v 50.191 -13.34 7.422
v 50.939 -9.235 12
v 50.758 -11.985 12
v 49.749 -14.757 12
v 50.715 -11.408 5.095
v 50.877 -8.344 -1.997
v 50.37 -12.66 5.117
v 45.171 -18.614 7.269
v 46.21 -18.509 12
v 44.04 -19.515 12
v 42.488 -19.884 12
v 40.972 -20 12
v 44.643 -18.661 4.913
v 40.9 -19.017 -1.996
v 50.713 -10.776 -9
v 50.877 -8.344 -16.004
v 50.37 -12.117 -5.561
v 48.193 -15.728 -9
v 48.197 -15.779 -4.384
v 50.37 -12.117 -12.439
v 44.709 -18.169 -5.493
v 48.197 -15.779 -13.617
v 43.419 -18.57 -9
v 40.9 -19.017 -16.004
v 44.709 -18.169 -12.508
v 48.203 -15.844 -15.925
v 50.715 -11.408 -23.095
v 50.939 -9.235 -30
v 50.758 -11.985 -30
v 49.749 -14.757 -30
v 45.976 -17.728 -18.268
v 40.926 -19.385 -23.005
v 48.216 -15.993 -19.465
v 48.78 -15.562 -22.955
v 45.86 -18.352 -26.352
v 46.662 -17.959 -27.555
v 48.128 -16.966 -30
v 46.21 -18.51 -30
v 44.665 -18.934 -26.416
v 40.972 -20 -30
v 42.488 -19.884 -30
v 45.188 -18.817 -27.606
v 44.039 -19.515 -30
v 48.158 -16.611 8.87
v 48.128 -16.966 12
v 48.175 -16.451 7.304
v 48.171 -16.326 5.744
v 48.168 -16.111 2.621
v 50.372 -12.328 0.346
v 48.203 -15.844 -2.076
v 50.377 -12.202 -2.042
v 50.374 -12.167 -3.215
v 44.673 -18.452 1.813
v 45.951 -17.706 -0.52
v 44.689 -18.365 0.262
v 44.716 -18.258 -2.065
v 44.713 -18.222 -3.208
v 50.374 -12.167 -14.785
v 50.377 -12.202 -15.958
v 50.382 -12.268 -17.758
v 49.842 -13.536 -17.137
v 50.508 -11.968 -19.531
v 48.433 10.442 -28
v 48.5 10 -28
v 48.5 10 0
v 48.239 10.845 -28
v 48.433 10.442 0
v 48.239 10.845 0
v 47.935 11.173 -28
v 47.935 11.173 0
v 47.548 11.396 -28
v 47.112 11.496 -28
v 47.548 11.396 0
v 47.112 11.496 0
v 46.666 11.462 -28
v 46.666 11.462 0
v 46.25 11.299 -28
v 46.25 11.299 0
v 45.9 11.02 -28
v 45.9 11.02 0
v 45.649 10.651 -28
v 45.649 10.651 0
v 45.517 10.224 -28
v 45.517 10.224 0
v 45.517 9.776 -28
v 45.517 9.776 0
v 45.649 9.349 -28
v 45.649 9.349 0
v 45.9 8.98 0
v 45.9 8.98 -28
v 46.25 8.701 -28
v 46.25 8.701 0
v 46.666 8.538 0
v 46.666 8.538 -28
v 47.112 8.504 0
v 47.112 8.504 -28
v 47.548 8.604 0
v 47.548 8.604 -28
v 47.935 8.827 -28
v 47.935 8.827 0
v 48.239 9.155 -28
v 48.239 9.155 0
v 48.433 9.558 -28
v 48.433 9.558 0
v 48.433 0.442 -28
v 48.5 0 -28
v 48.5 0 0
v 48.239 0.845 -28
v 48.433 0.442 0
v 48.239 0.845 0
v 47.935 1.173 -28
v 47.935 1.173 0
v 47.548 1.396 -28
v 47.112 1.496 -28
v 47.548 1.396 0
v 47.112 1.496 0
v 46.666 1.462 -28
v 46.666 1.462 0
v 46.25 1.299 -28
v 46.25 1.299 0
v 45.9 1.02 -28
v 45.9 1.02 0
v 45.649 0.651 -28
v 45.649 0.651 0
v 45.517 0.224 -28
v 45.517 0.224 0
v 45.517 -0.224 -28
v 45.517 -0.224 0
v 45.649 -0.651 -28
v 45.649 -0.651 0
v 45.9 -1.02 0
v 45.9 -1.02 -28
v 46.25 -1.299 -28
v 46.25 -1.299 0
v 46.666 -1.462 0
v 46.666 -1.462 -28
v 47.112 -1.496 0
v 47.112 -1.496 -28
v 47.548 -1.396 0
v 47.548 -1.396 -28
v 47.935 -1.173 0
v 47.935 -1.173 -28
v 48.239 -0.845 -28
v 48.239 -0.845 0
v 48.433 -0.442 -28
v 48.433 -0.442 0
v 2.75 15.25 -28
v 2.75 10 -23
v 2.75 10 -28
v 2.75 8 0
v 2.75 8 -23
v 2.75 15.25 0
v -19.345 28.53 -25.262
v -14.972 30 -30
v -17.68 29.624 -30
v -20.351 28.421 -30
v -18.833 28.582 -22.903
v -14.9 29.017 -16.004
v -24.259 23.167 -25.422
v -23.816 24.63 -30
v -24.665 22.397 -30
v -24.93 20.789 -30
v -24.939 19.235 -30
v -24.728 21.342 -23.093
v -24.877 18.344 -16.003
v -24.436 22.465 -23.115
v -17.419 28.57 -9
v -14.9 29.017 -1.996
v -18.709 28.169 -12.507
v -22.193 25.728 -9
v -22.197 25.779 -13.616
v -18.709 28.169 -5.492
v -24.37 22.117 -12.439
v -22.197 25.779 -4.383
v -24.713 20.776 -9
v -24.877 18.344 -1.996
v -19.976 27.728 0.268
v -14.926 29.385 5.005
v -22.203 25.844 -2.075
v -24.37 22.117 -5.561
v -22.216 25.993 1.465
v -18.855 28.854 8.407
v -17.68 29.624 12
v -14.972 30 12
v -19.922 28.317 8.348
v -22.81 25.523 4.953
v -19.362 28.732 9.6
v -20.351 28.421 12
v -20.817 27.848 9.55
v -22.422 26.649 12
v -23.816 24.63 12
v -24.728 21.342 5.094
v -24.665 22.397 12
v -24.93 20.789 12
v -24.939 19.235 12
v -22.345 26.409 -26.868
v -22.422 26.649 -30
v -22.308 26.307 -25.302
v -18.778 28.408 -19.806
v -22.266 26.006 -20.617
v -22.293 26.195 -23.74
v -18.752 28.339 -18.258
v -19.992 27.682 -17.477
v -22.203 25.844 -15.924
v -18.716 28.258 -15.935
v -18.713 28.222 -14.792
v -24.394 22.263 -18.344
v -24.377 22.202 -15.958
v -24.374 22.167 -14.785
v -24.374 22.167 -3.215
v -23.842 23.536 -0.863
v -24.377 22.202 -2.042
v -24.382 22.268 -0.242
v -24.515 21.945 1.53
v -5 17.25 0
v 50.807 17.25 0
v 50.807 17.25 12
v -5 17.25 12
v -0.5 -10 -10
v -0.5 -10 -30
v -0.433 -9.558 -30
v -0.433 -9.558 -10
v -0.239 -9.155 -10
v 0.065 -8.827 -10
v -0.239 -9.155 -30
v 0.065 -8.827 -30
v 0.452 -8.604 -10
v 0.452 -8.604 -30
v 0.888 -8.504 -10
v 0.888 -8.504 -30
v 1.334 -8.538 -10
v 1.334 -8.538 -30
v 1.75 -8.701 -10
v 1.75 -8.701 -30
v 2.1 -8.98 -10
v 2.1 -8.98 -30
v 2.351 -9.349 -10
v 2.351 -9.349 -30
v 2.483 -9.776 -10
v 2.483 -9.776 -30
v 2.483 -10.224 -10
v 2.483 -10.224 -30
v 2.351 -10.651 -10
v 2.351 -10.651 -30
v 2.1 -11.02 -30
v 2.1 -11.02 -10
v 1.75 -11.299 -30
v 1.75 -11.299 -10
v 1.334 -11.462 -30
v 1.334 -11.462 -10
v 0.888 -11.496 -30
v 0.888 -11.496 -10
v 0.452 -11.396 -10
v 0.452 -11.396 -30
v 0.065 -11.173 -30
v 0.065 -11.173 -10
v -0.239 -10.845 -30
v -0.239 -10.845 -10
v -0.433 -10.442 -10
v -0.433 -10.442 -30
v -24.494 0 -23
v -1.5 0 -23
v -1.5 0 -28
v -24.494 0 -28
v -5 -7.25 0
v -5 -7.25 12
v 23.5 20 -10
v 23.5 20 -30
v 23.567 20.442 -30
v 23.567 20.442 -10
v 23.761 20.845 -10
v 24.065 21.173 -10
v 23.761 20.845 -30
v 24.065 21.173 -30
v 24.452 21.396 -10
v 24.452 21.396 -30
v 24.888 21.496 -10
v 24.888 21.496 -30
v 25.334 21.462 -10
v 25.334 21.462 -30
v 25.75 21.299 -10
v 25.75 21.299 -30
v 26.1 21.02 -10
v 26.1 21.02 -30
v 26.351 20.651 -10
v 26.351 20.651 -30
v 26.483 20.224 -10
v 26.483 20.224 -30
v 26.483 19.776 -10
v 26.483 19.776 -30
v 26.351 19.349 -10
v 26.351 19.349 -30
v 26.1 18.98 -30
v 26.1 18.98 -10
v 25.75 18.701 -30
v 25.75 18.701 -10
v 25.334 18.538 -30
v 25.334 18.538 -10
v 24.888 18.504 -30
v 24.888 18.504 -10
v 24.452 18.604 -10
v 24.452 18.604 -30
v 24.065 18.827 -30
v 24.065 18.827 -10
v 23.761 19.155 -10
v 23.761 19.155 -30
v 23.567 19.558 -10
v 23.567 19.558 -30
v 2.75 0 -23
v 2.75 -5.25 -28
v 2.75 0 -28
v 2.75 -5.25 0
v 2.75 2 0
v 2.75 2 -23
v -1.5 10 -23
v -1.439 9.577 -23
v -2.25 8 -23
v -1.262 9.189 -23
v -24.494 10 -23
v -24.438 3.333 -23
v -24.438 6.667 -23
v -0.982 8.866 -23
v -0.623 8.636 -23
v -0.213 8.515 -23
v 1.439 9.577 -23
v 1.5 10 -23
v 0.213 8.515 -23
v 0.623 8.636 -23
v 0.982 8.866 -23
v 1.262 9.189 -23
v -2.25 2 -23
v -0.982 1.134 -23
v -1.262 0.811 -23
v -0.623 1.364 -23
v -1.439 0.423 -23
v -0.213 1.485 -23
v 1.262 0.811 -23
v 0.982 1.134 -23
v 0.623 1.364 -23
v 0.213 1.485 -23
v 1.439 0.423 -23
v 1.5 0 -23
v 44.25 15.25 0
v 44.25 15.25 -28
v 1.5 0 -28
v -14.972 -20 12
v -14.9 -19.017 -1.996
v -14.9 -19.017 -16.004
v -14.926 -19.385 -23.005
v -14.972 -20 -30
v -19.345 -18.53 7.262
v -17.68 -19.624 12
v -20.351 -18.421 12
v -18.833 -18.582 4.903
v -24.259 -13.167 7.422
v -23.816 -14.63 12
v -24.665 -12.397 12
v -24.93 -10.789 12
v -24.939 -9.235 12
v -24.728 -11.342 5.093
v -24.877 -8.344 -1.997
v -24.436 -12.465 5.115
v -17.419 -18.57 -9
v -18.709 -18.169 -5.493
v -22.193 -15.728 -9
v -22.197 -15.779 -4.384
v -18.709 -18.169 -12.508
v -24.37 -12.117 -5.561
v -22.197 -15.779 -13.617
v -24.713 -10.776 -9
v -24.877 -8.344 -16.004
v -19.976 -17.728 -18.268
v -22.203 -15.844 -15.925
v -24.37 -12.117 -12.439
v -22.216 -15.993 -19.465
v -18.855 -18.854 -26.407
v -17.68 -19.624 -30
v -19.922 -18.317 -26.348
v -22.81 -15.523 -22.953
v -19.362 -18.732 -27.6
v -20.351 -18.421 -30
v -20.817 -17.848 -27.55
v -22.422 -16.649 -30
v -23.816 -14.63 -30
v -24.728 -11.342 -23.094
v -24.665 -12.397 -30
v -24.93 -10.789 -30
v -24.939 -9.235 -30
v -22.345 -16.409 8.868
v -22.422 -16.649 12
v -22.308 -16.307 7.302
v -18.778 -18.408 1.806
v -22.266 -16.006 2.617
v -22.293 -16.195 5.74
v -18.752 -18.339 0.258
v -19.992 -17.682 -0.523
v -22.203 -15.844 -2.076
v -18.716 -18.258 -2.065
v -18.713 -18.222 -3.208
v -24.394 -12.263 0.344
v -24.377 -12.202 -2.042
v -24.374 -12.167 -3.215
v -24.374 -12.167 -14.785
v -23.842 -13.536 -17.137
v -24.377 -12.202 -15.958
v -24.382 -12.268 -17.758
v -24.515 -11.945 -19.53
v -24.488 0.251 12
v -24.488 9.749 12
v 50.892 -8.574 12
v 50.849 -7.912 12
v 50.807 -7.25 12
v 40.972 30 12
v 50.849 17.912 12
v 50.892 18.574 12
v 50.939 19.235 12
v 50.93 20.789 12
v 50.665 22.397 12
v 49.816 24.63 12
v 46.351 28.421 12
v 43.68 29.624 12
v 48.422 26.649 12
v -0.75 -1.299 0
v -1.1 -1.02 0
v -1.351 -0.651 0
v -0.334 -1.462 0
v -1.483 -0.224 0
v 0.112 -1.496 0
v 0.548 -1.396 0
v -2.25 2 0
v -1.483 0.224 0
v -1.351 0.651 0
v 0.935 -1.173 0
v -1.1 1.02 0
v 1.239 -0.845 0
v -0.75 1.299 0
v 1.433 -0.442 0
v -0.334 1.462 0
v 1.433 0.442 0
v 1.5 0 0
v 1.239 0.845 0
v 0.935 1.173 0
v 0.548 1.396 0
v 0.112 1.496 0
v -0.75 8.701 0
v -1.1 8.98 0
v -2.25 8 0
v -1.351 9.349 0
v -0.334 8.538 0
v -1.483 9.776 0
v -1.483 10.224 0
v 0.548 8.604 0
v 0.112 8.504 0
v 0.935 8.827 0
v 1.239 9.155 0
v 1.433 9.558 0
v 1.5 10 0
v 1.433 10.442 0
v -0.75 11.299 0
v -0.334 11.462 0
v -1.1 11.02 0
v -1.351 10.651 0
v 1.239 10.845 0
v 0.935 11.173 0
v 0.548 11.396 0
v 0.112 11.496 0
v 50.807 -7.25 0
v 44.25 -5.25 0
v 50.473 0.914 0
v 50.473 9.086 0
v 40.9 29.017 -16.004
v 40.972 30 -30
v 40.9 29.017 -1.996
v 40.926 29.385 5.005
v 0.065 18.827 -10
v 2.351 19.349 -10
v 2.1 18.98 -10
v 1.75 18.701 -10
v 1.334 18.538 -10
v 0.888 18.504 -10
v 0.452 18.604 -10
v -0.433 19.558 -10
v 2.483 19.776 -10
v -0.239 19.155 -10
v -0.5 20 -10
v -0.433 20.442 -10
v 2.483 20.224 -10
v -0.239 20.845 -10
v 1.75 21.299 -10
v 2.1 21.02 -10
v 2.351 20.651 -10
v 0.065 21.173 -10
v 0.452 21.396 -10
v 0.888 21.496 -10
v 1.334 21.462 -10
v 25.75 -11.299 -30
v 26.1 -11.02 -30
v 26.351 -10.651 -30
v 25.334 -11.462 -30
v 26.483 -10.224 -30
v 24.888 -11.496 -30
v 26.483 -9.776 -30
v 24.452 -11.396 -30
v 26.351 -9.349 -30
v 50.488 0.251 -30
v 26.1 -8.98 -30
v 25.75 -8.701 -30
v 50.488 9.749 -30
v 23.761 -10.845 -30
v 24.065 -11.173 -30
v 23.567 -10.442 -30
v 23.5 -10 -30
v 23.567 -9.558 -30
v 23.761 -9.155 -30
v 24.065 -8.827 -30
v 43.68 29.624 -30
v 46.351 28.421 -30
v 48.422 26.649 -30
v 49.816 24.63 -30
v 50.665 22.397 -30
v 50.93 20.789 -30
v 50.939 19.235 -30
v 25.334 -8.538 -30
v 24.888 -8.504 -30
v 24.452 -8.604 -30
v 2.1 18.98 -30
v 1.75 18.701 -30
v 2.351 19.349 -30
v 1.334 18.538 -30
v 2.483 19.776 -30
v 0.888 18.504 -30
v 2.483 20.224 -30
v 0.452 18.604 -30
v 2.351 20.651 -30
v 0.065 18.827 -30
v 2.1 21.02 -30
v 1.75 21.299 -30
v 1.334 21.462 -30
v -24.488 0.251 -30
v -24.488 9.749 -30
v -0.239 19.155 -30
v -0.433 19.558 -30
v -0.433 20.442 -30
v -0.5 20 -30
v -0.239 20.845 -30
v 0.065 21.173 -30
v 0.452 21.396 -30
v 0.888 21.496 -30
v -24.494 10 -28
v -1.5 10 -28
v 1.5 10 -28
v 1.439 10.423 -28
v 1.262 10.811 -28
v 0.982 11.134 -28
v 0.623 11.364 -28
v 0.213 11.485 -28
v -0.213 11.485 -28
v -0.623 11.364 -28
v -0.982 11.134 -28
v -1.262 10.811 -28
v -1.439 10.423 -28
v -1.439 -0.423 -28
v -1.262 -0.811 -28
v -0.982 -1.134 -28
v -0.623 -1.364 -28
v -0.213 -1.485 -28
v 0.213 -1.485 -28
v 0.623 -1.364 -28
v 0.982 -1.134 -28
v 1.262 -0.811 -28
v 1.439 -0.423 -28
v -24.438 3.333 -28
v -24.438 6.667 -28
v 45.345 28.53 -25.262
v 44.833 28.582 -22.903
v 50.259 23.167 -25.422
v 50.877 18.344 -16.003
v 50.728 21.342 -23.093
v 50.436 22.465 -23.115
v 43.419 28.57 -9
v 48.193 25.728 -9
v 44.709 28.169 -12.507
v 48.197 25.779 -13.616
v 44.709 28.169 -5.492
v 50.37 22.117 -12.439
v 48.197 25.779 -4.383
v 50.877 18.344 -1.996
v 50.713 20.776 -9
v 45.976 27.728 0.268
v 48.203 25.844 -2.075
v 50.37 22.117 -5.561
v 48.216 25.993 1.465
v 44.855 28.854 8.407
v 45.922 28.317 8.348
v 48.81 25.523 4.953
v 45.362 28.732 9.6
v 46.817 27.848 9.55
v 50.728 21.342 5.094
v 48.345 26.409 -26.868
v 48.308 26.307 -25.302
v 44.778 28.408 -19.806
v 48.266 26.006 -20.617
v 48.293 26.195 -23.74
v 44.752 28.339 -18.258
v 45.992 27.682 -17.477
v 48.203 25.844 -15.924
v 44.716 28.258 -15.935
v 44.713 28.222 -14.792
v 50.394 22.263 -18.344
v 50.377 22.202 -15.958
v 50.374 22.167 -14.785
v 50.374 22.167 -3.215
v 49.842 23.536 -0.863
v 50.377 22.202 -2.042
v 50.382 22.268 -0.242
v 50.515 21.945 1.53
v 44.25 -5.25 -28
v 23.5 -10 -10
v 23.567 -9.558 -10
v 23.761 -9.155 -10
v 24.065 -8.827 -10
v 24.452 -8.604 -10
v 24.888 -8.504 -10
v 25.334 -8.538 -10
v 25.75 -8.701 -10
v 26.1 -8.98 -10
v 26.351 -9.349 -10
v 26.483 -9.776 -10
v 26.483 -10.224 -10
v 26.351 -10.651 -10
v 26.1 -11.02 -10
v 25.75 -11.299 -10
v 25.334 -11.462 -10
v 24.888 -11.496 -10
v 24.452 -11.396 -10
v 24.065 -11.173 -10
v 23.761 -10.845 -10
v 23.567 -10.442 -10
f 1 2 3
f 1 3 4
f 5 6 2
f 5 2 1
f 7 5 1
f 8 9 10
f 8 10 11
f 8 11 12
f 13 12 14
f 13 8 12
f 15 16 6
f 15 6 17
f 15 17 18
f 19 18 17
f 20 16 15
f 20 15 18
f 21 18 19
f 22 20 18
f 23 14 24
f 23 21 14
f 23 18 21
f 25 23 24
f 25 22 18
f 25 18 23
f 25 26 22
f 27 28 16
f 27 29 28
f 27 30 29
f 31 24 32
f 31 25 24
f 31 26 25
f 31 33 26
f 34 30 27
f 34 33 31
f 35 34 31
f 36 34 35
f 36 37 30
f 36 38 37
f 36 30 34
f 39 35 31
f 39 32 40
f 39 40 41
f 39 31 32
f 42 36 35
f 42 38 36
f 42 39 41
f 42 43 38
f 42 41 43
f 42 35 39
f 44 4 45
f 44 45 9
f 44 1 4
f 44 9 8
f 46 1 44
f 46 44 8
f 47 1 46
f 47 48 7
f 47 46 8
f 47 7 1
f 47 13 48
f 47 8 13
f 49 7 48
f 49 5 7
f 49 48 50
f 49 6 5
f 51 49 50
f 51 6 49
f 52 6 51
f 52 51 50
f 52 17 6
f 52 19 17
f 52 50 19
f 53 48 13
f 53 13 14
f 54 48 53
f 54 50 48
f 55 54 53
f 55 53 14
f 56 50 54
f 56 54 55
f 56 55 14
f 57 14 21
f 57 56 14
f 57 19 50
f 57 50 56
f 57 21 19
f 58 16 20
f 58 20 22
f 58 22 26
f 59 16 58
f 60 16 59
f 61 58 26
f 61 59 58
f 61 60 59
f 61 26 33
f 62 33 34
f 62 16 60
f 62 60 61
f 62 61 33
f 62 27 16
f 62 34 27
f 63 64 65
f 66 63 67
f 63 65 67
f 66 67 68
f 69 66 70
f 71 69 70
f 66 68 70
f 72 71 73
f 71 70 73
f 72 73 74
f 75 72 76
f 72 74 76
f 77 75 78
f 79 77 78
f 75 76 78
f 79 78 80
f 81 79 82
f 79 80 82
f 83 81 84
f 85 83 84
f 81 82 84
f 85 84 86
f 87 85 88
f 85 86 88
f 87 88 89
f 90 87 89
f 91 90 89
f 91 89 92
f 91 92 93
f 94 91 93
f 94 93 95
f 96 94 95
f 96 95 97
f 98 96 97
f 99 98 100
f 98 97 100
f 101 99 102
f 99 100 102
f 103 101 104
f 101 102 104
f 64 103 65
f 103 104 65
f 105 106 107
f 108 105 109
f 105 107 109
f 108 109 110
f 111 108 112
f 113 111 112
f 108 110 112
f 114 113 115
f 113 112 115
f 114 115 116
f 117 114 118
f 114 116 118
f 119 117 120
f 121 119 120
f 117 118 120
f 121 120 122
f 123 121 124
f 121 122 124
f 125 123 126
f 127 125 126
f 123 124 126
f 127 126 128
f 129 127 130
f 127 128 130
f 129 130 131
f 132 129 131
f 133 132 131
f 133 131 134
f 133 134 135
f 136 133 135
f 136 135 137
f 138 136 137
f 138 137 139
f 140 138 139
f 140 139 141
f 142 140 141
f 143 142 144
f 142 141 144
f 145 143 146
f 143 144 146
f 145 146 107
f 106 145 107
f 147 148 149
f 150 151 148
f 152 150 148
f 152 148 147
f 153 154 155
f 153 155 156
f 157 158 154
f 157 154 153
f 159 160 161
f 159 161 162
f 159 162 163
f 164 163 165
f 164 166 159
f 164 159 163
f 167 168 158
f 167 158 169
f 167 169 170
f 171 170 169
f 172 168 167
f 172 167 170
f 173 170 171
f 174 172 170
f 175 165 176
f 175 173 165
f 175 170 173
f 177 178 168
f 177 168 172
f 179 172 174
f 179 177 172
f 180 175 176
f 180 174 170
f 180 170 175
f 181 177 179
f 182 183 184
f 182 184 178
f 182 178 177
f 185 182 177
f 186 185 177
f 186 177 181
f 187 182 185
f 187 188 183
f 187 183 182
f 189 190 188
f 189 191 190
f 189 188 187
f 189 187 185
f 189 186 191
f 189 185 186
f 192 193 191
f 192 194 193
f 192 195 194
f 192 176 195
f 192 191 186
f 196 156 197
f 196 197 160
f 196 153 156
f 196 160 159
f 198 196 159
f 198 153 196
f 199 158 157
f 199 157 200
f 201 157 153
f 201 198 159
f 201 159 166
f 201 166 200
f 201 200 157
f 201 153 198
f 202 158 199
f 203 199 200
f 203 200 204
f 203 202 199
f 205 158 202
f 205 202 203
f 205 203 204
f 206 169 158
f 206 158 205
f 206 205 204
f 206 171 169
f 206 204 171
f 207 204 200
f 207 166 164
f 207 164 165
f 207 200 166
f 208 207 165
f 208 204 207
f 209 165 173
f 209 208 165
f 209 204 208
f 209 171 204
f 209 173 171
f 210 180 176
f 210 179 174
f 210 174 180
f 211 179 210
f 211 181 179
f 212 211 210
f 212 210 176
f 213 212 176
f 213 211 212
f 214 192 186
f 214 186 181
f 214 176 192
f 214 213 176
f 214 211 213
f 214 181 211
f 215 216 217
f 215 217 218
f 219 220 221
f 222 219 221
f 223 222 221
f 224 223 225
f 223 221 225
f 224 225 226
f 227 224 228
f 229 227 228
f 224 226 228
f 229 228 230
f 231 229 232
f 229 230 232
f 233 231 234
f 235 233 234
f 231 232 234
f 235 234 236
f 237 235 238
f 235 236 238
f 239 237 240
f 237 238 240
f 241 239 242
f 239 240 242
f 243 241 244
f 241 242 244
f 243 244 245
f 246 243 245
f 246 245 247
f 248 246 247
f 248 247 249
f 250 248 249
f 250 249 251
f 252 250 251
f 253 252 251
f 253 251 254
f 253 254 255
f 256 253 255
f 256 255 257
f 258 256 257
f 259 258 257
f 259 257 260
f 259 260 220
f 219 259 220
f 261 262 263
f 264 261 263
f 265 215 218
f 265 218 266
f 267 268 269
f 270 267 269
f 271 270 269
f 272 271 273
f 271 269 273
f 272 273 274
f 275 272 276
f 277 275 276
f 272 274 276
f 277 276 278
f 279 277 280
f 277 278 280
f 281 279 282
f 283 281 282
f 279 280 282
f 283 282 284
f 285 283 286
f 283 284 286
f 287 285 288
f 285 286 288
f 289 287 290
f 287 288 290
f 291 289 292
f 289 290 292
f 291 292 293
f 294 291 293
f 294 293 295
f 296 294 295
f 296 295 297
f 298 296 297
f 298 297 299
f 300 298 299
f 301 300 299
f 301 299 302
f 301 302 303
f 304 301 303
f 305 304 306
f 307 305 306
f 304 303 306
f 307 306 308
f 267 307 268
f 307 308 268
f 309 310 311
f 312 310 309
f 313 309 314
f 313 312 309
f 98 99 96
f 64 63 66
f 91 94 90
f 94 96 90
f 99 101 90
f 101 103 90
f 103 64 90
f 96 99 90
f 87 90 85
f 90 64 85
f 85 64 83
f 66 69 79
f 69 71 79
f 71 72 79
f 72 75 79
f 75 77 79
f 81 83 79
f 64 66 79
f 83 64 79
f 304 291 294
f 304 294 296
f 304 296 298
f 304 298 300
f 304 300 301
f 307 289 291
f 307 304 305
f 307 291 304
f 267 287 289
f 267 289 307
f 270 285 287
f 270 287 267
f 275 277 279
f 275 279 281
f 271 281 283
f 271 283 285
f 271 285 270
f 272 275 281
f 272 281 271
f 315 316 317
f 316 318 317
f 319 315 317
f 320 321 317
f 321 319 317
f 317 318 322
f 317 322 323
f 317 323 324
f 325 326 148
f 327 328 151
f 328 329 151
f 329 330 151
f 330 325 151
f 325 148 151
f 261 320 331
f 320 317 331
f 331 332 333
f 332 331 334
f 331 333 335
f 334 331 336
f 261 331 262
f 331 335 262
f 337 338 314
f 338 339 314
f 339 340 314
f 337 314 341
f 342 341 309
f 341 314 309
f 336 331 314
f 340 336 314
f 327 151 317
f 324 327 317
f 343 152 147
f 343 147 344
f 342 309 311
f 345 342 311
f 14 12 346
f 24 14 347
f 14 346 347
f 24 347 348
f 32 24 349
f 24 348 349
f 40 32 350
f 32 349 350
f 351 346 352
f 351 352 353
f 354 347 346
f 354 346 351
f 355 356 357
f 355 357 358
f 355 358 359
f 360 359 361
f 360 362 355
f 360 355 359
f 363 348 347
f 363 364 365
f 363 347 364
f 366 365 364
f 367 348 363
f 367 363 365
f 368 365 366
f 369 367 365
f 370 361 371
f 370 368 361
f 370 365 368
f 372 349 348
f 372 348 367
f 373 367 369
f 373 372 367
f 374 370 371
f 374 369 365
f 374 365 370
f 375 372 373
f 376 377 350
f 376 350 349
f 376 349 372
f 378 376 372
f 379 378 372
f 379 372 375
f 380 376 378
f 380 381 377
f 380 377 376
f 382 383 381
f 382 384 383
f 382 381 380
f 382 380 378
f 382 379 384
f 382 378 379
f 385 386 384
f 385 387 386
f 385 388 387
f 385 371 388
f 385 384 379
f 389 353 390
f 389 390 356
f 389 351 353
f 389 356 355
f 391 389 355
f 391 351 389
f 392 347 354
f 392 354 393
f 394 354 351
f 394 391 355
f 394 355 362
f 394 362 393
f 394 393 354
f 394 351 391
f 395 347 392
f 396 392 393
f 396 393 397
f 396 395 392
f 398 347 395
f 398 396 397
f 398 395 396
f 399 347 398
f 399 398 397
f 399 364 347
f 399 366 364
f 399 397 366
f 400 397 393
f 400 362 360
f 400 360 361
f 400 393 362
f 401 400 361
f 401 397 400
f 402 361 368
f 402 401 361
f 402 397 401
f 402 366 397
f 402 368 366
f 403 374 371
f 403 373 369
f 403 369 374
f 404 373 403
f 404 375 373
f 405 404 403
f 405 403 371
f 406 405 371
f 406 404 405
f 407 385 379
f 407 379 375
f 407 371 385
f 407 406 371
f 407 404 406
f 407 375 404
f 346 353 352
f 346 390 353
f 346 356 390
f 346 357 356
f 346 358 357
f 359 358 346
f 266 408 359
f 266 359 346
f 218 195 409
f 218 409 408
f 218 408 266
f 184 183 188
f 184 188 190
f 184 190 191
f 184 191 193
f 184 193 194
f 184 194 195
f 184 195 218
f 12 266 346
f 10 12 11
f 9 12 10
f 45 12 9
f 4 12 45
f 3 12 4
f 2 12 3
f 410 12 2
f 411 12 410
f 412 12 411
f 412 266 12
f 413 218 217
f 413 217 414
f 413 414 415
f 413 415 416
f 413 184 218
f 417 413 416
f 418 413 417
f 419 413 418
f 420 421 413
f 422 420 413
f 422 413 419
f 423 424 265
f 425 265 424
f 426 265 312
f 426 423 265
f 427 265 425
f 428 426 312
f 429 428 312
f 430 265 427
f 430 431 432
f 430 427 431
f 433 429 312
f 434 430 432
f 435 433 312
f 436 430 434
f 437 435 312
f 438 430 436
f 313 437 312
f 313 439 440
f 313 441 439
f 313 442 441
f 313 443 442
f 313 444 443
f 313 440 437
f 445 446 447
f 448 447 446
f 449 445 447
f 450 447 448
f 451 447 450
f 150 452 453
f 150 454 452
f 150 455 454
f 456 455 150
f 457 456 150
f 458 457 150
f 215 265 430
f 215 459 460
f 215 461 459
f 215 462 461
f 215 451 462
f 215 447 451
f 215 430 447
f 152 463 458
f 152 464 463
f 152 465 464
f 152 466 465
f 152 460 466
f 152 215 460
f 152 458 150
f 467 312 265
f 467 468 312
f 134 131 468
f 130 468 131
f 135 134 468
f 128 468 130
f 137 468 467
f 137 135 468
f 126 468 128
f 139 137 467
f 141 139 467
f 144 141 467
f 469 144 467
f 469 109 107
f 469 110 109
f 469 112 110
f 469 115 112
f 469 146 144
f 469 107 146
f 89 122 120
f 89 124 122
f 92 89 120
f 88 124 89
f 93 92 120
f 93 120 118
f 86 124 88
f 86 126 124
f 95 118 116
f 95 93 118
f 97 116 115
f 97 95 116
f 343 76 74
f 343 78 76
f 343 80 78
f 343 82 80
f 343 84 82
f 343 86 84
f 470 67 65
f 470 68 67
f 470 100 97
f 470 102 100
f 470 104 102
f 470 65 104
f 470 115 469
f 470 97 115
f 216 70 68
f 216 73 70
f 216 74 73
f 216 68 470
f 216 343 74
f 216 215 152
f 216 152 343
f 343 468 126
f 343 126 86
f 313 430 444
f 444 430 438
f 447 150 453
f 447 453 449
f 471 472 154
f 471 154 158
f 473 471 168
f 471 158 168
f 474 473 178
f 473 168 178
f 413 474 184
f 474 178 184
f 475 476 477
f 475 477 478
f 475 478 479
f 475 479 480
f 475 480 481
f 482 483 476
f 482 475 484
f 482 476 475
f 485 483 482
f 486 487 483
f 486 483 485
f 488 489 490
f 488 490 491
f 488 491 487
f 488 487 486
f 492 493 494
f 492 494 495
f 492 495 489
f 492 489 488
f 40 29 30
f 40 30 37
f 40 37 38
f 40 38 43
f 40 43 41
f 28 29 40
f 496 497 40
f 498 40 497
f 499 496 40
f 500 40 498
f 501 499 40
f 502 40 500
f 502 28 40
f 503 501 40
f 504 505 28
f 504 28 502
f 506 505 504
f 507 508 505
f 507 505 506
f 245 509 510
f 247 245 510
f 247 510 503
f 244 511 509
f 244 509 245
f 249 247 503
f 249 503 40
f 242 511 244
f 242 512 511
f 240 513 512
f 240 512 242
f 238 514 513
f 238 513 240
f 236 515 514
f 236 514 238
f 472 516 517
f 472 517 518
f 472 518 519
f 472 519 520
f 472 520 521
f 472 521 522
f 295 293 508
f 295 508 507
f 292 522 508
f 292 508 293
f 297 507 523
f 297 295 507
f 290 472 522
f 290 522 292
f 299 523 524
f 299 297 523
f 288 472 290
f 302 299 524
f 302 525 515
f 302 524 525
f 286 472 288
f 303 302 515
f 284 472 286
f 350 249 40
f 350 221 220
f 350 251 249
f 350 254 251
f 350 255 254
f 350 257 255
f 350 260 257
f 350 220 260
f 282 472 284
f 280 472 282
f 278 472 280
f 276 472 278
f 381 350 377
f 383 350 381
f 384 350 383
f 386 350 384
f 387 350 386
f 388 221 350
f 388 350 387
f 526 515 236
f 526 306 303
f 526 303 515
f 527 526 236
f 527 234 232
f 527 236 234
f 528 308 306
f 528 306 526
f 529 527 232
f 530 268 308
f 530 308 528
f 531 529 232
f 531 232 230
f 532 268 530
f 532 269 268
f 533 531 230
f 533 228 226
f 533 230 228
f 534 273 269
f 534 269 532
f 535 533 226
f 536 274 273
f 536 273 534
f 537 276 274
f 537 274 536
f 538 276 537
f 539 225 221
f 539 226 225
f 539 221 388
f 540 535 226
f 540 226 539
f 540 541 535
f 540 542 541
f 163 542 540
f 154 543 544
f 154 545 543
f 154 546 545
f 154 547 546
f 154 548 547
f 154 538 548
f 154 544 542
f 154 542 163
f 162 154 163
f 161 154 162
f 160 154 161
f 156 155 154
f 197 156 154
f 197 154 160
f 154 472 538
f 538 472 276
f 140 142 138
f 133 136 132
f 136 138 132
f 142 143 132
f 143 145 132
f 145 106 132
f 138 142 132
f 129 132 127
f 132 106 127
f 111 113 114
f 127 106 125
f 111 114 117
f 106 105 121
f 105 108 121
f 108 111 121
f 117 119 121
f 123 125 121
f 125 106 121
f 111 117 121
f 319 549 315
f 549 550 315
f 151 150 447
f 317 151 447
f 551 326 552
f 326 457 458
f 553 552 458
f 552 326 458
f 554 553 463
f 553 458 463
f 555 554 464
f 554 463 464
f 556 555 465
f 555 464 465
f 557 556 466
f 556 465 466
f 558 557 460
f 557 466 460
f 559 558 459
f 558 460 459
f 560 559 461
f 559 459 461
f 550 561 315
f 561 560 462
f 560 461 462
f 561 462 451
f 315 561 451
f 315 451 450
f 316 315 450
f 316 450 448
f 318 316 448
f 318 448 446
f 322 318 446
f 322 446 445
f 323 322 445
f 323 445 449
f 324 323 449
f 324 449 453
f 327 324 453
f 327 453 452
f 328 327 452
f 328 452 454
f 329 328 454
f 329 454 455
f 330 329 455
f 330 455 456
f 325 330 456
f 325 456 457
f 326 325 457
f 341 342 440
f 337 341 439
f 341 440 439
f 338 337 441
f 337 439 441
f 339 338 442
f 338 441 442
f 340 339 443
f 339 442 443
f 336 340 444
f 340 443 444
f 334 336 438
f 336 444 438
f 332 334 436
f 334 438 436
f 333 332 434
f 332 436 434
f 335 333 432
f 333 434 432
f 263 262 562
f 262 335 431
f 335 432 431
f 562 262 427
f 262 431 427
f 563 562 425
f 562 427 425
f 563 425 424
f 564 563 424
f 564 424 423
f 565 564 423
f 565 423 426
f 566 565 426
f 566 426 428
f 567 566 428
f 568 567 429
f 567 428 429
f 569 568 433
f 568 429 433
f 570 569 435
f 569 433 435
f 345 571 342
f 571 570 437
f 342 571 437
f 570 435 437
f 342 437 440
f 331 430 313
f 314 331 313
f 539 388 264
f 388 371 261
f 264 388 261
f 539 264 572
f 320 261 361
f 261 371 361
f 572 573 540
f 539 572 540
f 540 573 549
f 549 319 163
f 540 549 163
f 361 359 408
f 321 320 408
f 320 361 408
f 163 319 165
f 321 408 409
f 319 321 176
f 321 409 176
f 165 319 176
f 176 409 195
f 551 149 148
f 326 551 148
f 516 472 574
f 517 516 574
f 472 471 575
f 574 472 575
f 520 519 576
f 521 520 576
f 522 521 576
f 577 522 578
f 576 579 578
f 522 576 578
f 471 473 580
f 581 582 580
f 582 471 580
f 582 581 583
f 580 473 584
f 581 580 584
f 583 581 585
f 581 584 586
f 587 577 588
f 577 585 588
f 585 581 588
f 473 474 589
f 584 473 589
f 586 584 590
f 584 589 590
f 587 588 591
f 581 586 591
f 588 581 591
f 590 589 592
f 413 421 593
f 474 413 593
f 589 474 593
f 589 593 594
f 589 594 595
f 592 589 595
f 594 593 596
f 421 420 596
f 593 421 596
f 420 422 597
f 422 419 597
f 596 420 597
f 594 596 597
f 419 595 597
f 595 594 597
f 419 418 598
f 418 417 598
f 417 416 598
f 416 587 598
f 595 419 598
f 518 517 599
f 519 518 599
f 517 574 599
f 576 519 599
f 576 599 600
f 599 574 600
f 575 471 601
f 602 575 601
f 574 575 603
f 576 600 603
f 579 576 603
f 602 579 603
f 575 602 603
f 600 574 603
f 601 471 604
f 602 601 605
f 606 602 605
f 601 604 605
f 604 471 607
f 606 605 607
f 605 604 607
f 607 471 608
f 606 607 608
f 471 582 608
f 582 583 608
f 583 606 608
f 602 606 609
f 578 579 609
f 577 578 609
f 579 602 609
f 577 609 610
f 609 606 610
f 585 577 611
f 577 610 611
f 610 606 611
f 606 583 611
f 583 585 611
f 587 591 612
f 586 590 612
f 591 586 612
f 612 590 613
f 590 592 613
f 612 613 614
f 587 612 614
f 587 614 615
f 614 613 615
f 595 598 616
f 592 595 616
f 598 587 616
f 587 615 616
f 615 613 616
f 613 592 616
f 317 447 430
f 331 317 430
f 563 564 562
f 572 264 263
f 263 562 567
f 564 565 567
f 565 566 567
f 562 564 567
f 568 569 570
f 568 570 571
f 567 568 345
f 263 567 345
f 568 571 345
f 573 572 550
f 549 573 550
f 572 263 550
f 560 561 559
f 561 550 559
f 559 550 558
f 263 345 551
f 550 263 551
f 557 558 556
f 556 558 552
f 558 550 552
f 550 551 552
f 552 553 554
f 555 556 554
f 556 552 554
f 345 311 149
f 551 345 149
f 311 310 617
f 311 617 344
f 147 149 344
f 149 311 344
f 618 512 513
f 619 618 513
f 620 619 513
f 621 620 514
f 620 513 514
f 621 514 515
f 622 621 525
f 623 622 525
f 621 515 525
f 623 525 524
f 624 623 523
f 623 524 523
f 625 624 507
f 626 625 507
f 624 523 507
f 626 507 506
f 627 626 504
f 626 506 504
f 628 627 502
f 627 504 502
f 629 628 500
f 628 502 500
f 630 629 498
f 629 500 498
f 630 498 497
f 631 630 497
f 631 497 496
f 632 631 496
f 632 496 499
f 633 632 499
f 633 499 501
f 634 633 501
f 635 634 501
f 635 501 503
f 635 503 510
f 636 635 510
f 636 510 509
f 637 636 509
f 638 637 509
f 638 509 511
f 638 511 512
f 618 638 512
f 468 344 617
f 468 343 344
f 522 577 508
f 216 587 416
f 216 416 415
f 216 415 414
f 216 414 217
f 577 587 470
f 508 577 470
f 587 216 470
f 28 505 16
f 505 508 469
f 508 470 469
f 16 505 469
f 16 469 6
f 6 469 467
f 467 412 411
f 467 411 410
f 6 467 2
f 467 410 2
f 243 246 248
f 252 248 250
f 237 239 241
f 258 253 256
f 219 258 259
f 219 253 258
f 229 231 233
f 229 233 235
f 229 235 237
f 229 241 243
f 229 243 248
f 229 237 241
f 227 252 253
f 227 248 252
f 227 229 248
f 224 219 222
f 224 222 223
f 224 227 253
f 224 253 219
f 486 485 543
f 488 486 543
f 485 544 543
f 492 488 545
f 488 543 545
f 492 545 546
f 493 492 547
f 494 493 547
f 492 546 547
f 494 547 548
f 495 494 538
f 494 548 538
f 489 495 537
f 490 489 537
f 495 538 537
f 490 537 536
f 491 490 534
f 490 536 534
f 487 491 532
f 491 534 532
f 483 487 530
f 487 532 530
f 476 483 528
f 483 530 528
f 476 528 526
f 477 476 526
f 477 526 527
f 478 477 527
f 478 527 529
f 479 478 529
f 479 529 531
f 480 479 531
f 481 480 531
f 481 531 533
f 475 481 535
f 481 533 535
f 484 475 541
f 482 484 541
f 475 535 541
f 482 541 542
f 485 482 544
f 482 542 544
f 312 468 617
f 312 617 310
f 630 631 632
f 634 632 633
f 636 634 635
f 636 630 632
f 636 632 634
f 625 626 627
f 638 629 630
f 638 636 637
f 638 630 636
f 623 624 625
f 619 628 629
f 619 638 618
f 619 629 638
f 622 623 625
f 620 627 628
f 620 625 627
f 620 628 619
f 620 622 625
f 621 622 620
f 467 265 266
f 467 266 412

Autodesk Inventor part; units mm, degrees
ref_plane "YZ Plane" through (0, 0, 0) normal (1, 0, 0) x (0, 1, 0)
ref_plane "XZ Plane" through (0, 0, 0) normal (0, 1, 0) x (-1, 0, 0)
ref_plane "XY Plane" through (0, 0, 0) normal (0, 0, 1) x (1, 0, 0)
sketch "Sketch1" plane through (0, 0, 0) normal (0, 0, 1) x (1, 0, 0)
  circle A0 centre (0, 0) radius 1.5
  circle A1 centre (47, 0) radius 1.5
  line L0 (1.5, 0) -> (45.5, 0) construction
  circle A2 centre (0, 10) radius 1.5
  circle A3 centre (47, 10) radius 1.5
  line L1 (1.5, 10) -> (45.5, 10) construction
  line L2 (0, 1.5) -> (0, 8.5) construction
  line L3 (47, 1.5) -> (47, 8.5) construction
  line L4 (-5, 30) -> (52, 30)
  line L5 (52, 30) -> (52, -20)
  line L6 (52, -20) -> (-5, -20)
  line L7 (-5, -20) -> (-5, 30)
  line L8 (2.75, 15.25) -> (44.25, 15.25)
  line L9 (44.25, 15.25) -> (44.25, -5.25)
  line L10 (44.25, -5.25) -> (2.75, -5.25)
  line L11 (2.75, -5.25) -> (2.75, 15.25)
  point P0 (23.5, 15.25)
  point P1 (23.5, 30)
  point P2 (44.25, 5)
  point P3 (52, 5)
  point P4 (2.75, 5)
  point P5 (-5, 5)
  point P6 (0, 5)
  dimension "d0" = 3
  dimension "d1" = 3
  dimension "d2" = 44
  dimension "d3" = 3
  dimension "d4" = 3
  dimension "d6" = 7
  dimension "d7" = 5
  dimension "d8" = 5
  dimension "d11" = 20.5
  dimension "d12" = 41.5
  dimension "d22" = 50
extrude "Extrusion1" add sketch "Sketch1" against normal blind 28
sketch "Sketch2" plane through (0, 0, 0) normal (0, 0, 1) x (1, 0, 0)
  line L0 (-5, 30) -> (52, 30) projected
  line L1 (-5, 30) -> (-26, 30)
  line L2 (-26, 30) -> (-26, -20)
  line L3 (-26, -20) -> (-5, -20)
  line L4 (-5, -20) -> (-5, 30)
  line L5 (2.75, -5.25) -> (2.75, 15.25) projected
  point P0 (0, 0)
  dimension "d15" = 28.75
extrude "Extrusion2" add sketch "Sketch2" against normal blind 28
sketch "Sketch3" plane through (0, 0, -28) normal (0, 0, -1) x (-1, 0, 0)
  line L0 (-2.75, 15.25) -> (-2.75, -5.25) construction
  line L1 (-2.75, -5.25) -> (-44.25, -5.25) construction
  line L2 (-44.25, -5.25) -> (-44.25, 15.25) construction
  line L3 (-44.25, 15.25) -> (-2.75, 15.25) construction
  circle A0 centre (-47, 10) radius 1.5 construction
  circle A1 centre (0, 10) radius 1.5 construction
  circle A2 centre (-47, 0) radius 1.5 construction
  circle A3 centre (0, 0) radius 1.5 construction
  line L4 (26, 30) -> (-52, 30) projected
  line L5 (-52, 30) -> (-52, -20) projected
  line L6 (-52, -20) -> (26, -20) projected
  line L7 (26, -20) -> (26, 30) projected
extrude "Extrusion3" add sketch "Sketch3" along normal blind 2
sketch "Sketch5" plane through (0, 0, -30) normal (0, 0, -1) x (-1, 0, 0)
  line L0 (-1, -10) -> (-25, -10) construction
  line L1 (-25, -10) -> (-25, 20) construction
  line L2 (-25, 20) -> (-1, 20) construction
  line L3 (-1, 20) -> (-1, -10) construction
  circle A0 centre (-1, -10) radius 1.5
  circle A1 centre (-25, -10) radius 1.5
  circle A2 centre (-25, 20) radius 1.5
  circle A3 centre (-1, 20) radius 1.5
  line L4 (-52, -20) -> (26, -20) projected
  line L5 (26, -20) -> (26, 30) projected
  point P0 (0, 0)
  point P1 (-13, -10)
  point P2 (-1, 5)
  point P3 (26, 5)
  point P4 (-13, -20)
  dimension "d23" = 24
  dimension "d24" = 30
  dimension "d25" = 3
  dimension "d26" = 3
  dimension "d27" = 3
  dimension "d28" = 3
extrude "Extrusion4" cut sketch "Sketch5" against normal blind 20
sketch "Sketch6" plane through (0, 0, 0) normal (0, 0, 1) x (1, 0, 0)
  line L0 (2.75, -5.25) -> (2.75, 15.25) projected
  line L1 (2.75, 15.25) -> (44.25, 15.25) projected
  line L2 (44.25, 15.25) -> (44.25, -5.25) projected
  line L3 (44.25, -5.25) -> (2.75, -5.25) projected
  circle A0 centre (47, 10) radius 1.5 projected
  circle A1 centre (0, 10) radius 1.5 projected
  circle A2 centre (47, 0) radius 1.5 projected
  circle A3 centre (0, 0) radius 1.5 projected
  line L4 (-26, 30) -> (52, 30) projected
  line L5 (-26, 30) -> (-26, -20) projected
  line L6 (52, -20) -> (-26, -20) projected
  line L7 (52, 30) -> (52, -20) projected
  line L8 (52, 30) -> (52, -20) projected
  line L9 (52, 17.25) -> (-5, 17.25)
  line L10 (-5, 17.25) -> (-5, -7.25)
  line L11 (-5, -7.25) -> (52, -7.25)
  line L12 (52, -7.25) -> (52, 17.25)
  point P0 (44.25, 5)
  point P1 (52, 5)
  dimension "d35" = 7.75
  dimension "d36" = 2
extrude "Extrusion5" add sketch "Sketch6" along normal blind 12 contours L4 L7 L9 L10 L11 L6 L5
sketch "Sketch7" plane through (-26, -20, -30) normal (-1, 0, 0) x (0, 0, 1)
  line L0 (42, 0) -> (42, 12.75) projected
  line L1 (0, 0) -> (0, 50) projected
  arc A0 (42, 0) -> (0, 0) centre (21, -198.8944) ccw
  line L2 (42, 50) -> (0, 50) projected
  line L3 (42, 37.25) -> (42, 50) projected
  arc A1 (0, 50) -> (42, 50) centre (21, 248.8944) ccw
  line L4 (0, 0) -> (42, 0) projected
  point P0 (30, 20)
  dimension "d39" = 200
  dimension "d40" = 200
extrude "Extrusion6" cut sketch "Sketch7" against normal through all
sketch "Sketch8" plane through (0, 0, 12) normal (0, 0, 1) x (1, 0, 0)
  line L0 (-26, 30) -> (52, 30) projected
  line L1 (52, -20) -> (-26, -20) projected
  arc A0 (52, 30) -> (52, -20) centre (250.4313, 5) ccw
  arc A1 (-26, -20) -> (-26, 30) centre (-224.4313, 5) ccw
  line L2 (52, -20) -> (52, 30)
  line L3 (-26, 30) -> (-26, -20)
  line L4 (-26, 28.8944) -> (52, 28.8944) projected
  point P0 (0, 0)
  dimension "d43" = 200
  dimension "d44" = 200
extrude "Extrusion7" cut sketch "Sketch8" against normal through all contours A1 L4 L3 | L2 L4 A0 | A1 L3 L4 | L4 L2 A0
fillet "Fillet3" radius 10 4 edges at (-25.8638, -18.8944, -9) (-25.8638, 28.8944, -9) (51.8638, -18.8944, -9) (51.8638, 28.8944, -9)
sketch "Sketch9" plane through (2.75, -5.25, 0) normal (1, 0, 0) x (0, 0, -1)
  line L0 (0, 0) -> (0, 20.5) construction
  line L1 (0, 0) -> (28, 0) construction
  line L2 (28, 20.5) -> (28, 0) construction
  line L3 (0, 20.5) -> (28, 20.5) construction
  line L4 (28, 15.25) -> (23, 15.25)
  line L5 (23, 15.25) -> (23, 5.25)
  line L6 (23, 5.25) -> (28, 5.25)
  line L7 (28, 5.25) -> (28, 15.25)
  point P0 (0, 5.25)
  point P1 (28, 10.25)
  dimension "d48" = 5
  dimension "d49" = 10
extrude "Extrusion8" cut sketch "Sketch9" against normal through all
sketch "Sketch10" plane through (0, 0, 0) normal (0, 0, 1) x (1, 0, 0)
  line L0 (2.75, 0) -> (2.75, 10) projected
  line L1 (2.75, -5.25) -> (2.75, 15.25) projected
  line L2 (2.75, 8) -> (-2.25, 8)
  line L3 (-2.25, 8) -> (-2.25, 2)
  line L4 (-2.25, 2) -> (2.75, 2)
  line L5 (2.75, 2) -> (2.75, 8)
  point P0 (0, 0)
  point P1 (2.75, 5)
  dimension "d52" = 5
  dimension "d53" = 6
extrude "Extrusion9" cut sketch "Sketch10" against normal blind 28
properties part number "AA048" material "ABS Plastic"
